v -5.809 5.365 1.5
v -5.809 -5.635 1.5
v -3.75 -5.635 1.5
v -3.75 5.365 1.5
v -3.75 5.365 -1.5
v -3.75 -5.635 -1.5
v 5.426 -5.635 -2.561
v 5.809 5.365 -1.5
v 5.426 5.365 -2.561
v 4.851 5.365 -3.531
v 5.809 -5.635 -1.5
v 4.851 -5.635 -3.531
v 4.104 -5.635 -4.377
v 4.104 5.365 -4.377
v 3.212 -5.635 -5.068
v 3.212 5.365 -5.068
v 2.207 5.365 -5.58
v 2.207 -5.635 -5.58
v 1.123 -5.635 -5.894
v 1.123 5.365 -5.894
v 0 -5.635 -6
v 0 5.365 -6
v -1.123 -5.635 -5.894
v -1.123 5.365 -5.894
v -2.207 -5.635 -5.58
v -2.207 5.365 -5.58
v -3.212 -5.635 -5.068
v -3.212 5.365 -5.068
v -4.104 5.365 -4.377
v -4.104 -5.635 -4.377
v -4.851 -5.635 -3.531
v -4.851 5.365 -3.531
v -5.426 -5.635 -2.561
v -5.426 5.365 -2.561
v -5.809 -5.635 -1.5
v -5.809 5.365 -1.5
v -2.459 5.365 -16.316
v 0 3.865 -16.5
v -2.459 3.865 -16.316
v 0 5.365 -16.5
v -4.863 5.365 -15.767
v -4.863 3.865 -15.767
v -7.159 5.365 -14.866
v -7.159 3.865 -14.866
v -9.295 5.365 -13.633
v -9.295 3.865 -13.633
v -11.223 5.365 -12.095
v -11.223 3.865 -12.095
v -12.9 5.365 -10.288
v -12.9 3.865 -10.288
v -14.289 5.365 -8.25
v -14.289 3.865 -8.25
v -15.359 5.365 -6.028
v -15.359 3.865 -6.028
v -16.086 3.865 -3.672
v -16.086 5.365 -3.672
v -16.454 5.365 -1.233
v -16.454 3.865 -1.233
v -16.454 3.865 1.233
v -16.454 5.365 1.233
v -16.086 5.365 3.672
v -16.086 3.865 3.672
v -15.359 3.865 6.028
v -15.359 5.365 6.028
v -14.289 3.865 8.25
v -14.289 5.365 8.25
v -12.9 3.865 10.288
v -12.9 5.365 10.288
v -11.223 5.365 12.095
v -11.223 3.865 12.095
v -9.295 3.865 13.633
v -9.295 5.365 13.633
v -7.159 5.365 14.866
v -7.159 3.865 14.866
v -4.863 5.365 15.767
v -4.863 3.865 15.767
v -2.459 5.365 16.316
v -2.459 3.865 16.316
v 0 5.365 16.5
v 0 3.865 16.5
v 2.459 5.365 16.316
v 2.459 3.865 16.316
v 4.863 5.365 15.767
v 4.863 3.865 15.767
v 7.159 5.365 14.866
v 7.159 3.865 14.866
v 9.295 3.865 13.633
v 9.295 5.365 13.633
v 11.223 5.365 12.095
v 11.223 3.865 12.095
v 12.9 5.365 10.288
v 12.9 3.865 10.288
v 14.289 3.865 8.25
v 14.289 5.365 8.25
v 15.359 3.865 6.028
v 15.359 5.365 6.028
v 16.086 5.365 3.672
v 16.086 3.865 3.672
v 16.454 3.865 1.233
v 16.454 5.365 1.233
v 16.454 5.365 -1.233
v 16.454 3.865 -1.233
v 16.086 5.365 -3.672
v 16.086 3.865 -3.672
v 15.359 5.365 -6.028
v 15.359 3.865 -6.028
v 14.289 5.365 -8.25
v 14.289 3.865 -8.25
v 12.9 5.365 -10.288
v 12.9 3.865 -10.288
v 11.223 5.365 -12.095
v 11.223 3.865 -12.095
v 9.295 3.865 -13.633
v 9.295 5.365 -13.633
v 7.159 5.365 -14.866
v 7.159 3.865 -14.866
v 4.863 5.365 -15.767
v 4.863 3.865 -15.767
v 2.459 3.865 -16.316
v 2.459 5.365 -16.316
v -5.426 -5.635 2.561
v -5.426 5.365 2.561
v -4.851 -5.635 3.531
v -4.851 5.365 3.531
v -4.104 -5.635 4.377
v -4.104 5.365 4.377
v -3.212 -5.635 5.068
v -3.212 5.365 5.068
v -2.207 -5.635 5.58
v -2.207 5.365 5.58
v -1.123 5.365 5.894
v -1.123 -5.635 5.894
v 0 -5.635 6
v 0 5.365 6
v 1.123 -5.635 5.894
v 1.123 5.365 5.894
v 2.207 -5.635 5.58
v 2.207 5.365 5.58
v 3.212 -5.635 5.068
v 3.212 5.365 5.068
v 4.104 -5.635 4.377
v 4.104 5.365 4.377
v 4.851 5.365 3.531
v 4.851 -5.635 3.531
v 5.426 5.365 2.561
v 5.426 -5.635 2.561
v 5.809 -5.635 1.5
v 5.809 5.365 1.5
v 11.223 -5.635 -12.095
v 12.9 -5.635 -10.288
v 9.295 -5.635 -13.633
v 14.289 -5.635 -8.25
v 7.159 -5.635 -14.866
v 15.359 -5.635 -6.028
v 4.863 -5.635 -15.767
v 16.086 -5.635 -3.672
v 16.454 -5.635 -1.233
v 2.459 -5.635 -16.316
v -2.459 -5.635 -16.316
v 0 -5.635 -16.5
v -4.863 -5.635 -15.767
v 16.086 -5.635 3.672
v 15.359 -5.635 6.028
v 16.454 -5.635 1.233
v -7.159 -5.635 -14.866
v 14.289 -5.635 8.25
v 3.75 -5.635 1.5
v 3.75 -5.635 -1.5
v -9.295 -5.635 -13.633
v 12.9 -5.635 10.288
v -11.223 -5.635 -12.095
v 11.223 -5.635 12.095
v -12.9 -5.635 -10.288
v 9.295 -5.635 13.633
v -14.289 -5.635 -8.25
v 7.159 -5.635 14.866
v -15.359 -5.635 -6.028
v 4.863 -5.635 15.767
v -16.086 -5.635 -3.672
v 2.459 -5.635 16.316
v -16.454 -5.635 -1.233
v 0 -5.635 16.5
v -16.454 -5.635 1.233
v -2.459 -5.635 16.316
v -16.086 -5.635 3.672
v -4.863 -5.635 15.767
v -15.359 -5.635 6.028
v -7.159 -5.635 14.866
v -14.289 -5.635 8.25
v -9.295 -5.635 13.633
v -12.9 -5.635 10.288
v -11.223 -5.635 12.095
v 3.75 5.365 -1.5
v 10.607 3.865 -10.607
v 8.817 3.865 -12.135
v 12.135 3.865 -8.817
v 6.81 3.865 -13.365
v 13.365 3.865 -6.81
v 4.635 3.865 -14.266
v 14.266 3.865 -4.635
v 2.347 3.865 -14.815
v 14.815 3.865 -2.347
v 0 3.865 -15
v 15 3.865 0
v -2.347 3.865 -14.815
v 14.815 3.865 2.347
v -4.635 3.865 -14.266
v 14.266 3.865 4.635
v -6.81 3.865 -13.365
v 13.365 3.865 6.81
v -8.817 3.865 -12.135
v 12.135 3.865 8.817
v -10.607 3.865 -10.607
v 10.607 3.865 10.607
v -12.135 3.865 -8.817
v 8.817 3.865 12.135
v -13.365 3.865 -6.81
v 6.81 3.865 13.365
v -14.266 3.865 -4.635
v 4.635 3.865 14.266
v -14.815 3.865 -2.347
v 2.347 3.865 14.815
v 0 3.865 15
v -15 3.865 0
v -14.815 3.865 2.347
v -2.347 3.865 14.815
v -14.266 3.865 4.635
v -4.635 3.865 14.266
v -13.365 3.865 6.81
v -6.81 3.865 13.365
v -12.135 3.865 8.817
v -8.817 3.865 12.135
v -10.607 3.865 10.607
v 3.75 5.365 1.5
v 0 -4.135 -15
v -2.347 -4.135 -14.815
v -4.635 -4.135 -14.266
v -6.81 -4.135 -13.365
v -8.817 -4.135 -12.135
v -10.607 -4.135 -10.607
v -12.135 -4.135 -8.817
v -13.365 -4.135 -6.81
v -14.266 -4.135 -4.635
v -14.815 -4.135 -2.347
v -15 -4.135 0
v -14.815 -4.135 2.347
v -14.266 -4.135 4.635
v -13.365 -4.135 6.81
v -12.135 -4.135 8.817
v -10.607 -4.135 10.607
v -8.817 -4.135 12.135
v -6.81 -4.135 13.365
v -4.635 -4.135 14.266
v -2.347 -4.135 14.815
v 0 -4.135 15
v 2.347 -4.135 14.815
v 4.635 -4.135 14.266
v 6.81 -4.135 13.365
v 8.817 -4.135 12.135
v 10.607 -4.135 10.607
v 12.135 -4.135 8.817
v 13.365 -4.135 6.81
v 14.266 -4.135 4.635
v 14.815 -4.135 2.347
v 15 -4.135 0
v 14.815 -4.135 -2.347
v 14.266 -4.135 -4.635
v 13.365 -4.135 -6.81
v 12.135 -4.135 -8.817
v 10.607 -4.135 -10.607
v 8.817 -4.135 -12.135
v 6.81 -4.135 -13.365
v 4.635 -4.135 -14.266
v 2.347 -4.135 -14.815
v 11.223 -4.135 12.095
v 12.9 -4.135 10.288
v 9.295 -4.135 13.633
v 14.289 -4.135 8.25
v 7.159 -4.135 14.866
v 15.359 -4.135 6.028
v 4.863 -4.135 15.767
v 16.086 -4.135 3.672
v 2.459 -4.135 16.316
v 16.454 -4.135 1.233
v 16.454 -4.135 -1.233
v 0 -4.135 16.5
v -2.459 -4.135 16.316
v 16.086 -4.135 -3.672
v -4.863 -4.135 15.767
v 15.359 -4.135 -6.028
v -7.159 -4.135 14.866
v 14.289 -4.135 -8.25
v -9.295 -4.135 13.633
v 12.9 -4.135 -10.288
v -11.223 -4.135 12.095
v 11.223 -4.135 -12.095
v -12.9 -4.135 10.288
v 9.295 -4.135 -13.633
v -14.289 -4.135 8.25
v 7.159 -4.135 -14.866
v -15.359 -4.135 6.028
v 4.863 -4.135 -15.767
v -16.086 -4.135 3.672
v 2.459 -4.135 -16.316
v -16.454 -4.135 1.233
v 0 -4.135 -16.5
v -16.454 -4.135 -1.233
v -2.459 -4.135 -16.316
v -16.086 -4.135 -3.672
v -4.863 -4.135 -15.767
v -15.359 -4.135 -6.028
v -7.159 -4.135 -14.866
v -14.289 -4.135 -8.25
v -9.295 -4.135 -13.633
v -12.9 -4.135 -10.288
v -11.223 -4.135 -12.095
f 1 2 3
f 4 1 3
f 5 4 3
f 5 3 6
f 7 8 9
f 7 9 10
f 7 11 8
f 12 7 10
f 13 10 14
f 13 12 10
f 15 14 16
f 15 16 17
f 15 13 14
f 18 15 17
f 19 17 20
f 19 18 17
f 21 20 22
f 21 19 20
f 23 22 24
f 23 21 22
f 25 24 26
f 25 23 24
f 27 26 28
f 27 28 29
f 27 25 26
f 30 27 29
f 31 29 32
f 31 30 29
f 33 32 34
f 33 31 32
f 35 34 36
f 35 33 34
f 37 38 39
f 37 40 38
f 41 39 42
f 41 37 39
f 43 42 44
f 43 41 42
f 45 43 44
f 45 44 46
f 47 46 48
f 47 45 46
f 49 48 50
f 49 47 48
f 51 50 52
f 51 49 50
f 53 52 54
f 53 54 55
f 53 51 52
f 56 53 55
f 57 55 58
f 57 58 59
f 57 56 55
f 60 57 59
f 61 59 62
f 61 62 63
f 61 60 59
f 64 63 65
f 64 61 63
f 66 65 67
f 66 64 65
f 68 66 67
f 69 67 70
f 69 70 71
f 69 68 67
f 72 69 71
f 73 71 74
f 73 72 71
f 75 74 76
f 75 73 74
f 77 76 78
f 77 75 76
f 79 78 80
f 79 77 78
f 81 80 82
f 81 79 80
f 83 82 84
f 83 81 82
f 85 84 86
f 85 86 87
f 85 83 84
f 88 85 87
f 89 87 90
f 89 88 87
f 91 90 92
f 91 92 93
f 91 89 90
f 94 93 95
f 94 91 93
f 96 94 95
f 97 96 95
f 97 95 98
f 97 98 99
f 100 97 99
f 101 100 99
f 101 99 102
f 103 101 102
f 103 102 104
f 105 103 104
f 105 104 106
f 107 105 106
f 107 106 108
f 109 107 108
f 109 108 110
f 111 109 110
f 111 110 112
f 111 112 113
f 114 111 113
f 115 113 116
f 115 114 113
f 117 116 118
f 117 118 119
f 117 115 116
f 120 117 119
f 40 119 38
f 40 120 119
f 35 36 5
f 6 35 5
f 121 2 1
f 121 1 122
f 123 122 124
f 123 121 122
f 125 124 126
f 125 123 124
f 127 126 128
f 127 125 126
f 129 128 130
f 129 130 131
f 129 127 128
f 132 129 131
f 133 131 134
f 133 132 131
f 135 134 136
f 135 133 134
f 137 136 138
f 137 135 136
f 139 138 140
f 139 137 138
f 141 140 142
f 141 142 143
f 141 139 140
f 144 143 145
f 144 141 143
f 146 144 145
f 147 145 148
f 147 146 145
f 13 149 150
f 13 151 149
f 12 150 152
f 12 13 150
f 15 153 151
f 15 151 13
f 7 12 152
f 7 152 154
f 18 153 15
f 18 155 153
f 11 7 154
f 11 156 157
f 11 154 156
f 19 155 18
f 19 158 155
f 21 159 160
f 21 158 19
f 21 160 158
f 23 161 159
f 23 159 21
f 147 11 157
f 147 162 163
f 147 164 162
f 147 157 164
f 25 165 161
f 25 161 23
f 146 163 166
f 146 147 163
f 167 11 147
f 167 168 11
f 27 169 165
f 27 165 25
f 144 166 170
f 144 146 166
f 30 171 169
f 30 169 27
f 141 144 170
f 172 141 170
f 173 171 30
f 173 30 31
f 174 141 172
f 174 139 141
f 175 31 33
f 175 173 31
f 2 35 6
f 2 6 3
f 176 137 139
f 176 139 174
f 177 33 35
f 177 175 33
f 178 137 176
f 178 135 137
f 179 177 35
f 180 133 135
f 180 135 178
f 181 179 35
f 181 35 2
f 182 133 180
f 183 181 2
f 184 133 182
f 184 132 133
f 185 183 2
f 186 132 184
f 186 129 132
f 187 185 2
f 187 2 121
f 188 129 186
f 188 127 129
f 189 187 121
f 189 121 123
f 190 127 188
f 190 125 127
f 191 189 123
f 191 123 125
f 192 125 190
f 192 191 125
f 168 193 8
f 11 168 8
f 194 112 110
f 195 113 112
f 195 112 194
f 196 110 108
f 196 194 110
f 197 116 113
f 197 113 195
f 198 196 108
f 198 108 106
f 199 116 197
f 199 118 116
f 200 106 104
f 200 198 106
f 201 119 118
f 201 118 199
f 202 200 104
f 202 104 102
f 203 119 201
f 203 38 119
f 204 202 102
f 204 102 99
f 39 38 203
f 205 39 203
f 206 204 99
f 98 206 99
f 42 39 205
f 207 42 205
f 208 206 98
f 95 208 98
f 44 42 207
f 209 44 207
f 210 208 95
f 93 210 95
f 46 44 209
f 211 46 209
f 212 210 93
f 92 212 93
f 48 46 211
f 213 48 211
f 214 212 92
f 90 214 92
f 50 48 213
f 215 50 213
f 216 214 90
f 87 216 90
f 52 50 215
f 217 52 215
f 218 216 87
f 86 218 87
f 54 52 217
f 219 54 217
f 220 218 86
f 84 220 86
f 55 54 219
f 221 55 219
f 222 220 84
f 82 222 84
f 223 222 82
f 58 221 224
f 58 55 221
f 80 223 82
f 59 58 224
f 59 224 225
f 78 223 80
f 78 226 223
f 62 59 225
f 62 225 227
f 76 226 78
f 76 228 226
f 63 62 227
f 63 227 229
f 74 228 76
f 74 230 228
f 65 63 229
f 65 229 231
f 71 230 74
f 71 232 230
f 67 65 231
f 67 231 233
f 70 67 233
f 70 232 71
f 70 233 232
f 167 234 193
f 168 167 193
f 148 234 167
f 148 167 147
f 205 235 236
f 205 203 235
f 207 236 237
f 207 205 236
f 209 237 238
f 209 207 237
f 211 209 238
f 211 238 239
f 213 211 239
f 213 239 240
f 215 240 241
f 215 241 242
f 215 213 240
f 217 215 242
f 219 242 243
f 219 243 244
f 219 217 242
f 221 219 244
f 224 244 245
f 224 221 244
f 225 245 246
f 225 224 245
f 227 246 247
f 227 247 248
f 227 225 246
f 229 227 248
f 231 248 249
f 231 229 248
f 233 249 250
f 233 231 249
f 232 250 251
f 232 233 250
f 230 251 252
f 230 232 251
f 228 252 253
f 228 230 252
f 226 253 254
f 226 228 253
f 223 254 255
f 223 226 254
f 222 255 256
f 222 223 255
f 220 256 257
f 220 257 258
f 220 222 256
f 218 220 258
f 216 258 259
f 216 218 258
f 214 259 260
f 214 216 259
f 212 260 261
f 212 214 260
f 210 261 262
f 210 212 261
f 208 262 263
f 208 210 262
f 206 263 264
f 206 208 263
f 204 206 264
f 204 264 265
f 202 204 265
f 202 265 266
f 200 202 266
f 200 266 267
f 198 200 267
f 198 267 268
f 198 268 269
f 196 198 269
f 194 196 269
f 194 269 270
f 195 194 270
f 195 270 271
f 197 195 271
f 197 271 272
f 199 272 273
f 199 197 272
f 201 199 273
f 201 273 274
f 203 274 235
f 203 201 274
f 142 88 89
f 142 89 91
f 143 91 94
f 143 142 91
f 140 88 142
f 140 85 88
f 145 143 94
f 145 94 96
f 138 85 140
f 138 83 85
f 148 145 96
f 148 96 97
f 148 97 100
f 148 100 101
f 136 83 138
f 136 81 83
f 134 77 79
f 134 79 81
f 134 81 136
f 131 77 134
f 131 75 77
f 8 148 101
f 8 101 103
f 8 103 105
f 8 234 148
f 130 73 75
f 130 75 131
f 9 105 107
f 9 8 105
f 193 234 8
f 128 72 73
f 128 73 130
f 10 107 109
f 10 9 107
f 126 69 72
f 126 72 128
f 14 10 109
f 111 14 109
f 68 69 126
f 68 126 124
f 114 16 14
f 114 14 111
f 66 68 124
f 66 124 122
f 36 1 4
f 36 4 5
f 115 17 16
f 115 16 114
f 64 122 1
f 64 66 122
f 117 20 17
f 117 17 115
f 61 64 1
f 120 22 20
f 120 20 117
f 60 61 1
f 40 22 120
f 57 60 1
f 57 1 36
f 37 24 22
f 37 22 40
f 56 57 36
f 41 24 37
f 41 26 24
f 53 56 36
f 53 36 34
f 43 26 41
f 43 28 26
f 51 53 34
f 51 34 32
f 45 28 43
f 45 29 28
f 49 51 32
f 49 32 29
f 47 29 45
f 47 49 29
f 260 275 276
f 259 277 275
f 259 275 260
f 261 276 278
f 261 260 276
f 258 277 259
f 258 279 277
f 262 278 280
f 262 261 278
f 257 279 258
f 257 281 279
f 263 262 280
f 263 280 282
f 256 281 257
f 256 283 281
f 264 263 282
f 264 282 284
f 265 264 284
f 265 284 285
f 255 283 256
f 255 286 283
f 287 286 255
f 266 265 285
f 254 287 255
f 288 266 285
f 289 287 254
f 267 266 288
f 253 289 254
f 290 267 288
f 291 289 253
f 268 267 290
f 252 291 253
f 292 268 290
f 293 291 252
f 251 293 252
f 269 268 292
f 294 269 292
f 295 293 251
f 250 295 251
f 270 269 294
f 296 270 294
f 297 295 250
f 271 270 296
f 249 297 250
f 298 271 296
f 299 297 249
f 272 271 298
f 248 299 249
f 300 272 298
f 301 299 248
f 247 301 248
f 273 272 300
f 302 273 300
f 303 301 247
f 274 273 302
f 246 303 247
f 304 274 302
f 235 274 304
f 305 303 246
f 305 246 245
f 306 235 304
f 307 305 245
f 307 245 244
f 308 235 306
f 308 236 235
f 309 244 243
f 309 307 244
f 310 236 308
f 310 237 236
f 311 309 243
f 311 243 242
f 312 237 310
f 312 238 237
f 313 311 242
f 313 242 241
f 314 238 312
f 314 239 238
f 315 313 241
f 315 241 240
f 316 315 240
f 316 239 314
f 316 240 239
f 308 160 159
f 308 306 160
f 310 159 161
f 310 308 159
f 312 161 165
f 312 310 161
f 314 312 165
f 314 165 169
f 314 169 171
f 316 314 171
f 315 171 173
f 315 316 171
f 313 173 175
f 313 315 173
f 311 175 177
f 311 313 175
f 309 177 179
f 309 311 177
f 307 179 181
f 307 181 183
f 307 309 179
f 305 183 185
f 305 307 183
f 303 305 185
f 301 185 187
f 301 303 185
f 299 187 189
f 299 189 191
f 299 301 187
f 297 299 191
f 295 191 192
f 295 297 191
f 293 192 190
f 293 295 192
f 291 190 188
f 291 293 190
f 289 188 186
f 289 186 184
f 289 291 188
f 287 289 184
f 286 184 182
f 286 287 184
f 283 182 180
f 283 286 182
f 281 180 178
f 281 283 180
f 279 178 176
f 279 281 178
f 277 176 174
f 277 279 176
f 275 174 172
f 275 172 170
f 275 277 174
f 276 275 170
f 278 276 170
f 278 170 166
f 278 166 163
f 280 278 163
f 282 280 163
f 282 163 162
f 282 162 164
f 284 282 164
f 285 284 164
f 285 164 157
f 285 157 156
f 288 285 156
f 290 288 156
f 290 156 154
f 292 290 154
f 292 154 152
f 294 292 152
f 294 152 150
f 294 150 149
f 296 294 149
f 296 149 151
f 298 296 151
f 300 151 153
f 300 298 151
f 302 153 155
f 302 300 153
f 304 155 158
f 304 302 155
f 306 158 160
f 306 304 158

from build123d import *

# Parameters (mm, degrees)
ESQUISSE6_W        = 4.5
ESQUISSE6_H        = 3
BOSS_EXTRU_1_DEPTH = 11


with BuildPart() as part:
    # Esquisse2 → Révolution1 (revolve)
    with BuildSketch(Plane.XY, mode=Mode.PRIVATE) as r_volution1_sk:
        Polygon((6, 5.365286165), (6, -5.634713835), (16.5, -5.634713835), (16.5, -4.134713835), (15, -4.134713835), (15, 3.865286165), (16.5, 3.865286165), (16.5, 5.365286165), align=None)
    revolve(r_volution1_sk.sketch.rotate(Axis((0, 0, 0), (0, 1, 0)), 90), axis=Axis((0, 0, 0), (0, 1, 0)))

    # Esquisse6 → Boss.-Extru.1 (add)
    with BuildSketch(Plane(origin=(0, 5.365286165, 0), x_dir=(1, 0, 0), z_dir=(0, 1, 0))):
        with Locations((-6, 0)):
            Rectangle(ESQUISSE6_W, ESQUISSE6_H)
        with Locations((6, 0)):
            Rectangle(ESQUISSE6_W, ESQUISSE6_H)
    extrude(amount=-BOSS_EXTRU_1_DEPTH)


solid = part.part
